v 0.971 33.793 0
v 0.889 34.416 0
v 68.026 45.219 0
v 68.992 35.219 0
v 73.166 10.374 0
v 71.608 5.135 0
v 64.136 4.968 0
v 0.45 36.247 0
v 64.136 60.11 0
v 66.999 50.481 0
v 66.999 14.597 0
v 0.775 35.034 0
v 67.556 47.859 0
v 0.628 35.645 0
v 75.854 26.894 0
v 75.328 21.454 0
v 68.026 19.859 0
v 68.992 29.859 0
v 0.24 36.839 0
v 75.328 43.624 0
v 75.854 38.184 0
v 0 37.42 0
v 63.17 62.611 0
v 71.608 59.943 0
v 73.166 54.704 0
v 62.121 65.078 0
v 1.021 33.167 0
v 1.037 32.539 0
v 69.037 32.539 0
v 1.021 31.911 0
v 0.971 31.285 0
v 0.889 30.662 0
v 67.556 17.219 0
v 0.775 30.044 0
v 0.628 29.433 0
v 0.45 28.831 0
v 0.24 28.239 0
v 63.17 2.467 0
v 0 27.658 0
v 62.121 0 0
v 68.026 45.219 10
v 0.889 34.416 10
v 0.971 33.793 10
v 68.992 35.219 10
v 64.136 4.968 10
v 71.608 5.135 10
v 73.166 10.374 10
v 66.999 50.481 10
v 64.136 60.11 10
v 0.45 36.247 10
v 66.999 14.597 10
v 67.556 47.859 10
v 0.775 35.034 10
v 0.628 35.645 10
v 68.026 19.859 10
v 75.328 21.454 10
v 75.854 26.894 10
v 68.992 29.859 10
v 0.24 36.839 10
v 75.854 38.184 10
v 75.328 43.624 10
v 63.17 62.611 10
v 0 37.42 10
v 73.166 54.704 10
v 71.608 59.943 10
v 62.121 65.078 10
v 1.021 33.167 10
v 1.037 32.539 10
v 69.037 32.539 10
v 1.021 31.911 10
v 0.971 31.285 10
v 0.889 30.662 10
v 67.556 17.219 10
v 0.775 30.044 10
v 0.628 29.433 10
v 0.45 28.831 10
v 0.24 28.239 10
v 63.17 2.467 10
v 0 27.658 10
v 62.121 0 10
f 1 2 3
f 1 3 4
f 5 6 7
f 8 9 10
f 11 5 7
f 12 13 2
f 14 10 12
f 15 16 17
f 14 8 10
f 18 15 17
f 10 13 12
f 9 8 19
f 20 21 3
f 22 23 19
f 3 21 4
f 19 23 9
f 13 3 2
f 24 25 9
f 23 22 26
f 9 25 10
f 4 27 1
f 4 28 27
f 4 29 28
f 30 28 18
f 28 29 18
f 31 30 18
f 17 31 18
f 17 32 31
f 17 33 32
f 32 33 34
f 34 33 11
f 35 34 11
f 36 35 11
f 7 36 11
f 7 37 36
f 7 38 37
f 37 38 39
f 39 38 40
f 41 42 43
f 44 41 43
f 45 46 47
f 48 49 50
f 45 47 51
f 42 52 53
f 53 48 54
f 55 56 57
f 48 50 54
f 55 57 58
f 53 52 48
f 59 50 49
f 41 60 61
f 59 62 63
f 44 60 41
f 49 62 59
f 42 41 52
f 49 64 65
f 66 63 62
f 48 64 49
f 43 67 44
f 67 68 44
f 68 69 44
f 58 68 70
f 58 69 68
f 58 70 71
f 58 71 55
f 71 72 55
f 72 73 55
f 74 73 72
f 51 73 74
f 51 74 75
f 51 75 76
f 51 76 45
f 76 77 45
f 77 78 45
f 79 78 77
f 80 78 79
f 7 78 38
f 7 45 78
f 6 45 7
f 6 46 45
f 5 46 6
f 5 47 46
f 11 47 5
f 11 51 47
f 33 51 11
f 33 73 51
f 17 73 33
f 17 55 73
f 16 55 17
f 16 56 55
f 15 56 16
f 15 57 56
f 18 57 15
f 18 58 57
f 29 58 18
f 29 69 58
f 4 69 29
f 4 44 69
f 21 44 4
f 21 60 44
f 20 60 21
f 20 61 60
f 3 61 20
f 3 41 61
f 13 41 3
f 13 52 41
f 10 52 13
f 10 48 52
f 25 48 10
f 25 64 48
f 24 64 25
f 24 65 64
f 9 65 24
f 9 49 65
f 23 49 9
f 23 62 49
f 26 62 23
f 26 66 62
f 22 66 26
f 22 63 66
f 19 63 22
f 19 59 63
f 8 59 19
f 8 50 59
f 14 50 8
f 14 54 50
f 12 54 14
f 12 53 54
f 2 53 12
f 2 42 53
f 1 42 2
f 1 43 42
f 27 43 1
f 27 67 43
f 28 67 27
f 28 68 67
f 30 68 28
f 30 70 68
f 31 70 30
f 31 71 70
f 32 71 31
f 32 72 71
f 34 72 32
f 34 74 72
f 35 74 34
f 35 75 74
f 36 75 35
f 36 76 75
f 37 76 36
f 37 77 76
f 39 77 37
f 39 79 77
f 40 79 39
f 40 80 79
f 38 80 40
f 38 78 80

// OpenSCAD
$fn = 32;

// ----------------------------------------------------------------------
// Gear sector: 4 teeth on 48 degrees
// ----------------------------------------------------------------------

// --- parameters (mm) ---
sector_angle = 48;        // sector angle, degrees
root_r = 80;              // root circle radius
tooth_h = 7;              // tooth height over the root circle
teeth = 4;                // number of teeth on the sector
hub_r = 12;               // hub bore radius
plate_t = 10;             // sector thickness, Z
arc_step = 3;             // sampling step of the root/hub arcs, degrees

tip_r = root_r + tooth_h;  // tip circle radius

profile = [[62.121, 0], [63.17, 2.467], [64.136, 4.968], [71.608, 5.135], [73.166, 10.374], [66.999, 14.597], [67.556, 17.219], [68.026, 19.859], [75.328, 21.454], [75.854, 26.894], [68.992, 29.859], [69.037, 32.539], [68.992, 35.219], [75.854, 38.184], [75.328, 43.624], [68.026, 45.219], [67.556, 47.859], [66.999, 50.481], [73.166, 54.704], [71.608, 59.943], [64.136, 60.11], [63.17, 62.611], [62.121, 65.078], [0, 37.42], [0.24, 36.839], [0.45, 36.247], [0.628, 35.645], [0.775, 35.034], [0.889, 34.416], [0.971, 33.793], [1.021, 33.167], [1.037, 32.539], [1.021, 31.911], [0.971, 31.285], [0.889, 30.662], [0.775, 30.044], [0.628, 29.433], [0.45, 28.831], [0.24, 28.239], [0, 27.658]];  // primary outline, 40 points, counter clockwise

// --- the one profile operation ---
linear_extrude(height = plate_t) polygon(points = profile);
